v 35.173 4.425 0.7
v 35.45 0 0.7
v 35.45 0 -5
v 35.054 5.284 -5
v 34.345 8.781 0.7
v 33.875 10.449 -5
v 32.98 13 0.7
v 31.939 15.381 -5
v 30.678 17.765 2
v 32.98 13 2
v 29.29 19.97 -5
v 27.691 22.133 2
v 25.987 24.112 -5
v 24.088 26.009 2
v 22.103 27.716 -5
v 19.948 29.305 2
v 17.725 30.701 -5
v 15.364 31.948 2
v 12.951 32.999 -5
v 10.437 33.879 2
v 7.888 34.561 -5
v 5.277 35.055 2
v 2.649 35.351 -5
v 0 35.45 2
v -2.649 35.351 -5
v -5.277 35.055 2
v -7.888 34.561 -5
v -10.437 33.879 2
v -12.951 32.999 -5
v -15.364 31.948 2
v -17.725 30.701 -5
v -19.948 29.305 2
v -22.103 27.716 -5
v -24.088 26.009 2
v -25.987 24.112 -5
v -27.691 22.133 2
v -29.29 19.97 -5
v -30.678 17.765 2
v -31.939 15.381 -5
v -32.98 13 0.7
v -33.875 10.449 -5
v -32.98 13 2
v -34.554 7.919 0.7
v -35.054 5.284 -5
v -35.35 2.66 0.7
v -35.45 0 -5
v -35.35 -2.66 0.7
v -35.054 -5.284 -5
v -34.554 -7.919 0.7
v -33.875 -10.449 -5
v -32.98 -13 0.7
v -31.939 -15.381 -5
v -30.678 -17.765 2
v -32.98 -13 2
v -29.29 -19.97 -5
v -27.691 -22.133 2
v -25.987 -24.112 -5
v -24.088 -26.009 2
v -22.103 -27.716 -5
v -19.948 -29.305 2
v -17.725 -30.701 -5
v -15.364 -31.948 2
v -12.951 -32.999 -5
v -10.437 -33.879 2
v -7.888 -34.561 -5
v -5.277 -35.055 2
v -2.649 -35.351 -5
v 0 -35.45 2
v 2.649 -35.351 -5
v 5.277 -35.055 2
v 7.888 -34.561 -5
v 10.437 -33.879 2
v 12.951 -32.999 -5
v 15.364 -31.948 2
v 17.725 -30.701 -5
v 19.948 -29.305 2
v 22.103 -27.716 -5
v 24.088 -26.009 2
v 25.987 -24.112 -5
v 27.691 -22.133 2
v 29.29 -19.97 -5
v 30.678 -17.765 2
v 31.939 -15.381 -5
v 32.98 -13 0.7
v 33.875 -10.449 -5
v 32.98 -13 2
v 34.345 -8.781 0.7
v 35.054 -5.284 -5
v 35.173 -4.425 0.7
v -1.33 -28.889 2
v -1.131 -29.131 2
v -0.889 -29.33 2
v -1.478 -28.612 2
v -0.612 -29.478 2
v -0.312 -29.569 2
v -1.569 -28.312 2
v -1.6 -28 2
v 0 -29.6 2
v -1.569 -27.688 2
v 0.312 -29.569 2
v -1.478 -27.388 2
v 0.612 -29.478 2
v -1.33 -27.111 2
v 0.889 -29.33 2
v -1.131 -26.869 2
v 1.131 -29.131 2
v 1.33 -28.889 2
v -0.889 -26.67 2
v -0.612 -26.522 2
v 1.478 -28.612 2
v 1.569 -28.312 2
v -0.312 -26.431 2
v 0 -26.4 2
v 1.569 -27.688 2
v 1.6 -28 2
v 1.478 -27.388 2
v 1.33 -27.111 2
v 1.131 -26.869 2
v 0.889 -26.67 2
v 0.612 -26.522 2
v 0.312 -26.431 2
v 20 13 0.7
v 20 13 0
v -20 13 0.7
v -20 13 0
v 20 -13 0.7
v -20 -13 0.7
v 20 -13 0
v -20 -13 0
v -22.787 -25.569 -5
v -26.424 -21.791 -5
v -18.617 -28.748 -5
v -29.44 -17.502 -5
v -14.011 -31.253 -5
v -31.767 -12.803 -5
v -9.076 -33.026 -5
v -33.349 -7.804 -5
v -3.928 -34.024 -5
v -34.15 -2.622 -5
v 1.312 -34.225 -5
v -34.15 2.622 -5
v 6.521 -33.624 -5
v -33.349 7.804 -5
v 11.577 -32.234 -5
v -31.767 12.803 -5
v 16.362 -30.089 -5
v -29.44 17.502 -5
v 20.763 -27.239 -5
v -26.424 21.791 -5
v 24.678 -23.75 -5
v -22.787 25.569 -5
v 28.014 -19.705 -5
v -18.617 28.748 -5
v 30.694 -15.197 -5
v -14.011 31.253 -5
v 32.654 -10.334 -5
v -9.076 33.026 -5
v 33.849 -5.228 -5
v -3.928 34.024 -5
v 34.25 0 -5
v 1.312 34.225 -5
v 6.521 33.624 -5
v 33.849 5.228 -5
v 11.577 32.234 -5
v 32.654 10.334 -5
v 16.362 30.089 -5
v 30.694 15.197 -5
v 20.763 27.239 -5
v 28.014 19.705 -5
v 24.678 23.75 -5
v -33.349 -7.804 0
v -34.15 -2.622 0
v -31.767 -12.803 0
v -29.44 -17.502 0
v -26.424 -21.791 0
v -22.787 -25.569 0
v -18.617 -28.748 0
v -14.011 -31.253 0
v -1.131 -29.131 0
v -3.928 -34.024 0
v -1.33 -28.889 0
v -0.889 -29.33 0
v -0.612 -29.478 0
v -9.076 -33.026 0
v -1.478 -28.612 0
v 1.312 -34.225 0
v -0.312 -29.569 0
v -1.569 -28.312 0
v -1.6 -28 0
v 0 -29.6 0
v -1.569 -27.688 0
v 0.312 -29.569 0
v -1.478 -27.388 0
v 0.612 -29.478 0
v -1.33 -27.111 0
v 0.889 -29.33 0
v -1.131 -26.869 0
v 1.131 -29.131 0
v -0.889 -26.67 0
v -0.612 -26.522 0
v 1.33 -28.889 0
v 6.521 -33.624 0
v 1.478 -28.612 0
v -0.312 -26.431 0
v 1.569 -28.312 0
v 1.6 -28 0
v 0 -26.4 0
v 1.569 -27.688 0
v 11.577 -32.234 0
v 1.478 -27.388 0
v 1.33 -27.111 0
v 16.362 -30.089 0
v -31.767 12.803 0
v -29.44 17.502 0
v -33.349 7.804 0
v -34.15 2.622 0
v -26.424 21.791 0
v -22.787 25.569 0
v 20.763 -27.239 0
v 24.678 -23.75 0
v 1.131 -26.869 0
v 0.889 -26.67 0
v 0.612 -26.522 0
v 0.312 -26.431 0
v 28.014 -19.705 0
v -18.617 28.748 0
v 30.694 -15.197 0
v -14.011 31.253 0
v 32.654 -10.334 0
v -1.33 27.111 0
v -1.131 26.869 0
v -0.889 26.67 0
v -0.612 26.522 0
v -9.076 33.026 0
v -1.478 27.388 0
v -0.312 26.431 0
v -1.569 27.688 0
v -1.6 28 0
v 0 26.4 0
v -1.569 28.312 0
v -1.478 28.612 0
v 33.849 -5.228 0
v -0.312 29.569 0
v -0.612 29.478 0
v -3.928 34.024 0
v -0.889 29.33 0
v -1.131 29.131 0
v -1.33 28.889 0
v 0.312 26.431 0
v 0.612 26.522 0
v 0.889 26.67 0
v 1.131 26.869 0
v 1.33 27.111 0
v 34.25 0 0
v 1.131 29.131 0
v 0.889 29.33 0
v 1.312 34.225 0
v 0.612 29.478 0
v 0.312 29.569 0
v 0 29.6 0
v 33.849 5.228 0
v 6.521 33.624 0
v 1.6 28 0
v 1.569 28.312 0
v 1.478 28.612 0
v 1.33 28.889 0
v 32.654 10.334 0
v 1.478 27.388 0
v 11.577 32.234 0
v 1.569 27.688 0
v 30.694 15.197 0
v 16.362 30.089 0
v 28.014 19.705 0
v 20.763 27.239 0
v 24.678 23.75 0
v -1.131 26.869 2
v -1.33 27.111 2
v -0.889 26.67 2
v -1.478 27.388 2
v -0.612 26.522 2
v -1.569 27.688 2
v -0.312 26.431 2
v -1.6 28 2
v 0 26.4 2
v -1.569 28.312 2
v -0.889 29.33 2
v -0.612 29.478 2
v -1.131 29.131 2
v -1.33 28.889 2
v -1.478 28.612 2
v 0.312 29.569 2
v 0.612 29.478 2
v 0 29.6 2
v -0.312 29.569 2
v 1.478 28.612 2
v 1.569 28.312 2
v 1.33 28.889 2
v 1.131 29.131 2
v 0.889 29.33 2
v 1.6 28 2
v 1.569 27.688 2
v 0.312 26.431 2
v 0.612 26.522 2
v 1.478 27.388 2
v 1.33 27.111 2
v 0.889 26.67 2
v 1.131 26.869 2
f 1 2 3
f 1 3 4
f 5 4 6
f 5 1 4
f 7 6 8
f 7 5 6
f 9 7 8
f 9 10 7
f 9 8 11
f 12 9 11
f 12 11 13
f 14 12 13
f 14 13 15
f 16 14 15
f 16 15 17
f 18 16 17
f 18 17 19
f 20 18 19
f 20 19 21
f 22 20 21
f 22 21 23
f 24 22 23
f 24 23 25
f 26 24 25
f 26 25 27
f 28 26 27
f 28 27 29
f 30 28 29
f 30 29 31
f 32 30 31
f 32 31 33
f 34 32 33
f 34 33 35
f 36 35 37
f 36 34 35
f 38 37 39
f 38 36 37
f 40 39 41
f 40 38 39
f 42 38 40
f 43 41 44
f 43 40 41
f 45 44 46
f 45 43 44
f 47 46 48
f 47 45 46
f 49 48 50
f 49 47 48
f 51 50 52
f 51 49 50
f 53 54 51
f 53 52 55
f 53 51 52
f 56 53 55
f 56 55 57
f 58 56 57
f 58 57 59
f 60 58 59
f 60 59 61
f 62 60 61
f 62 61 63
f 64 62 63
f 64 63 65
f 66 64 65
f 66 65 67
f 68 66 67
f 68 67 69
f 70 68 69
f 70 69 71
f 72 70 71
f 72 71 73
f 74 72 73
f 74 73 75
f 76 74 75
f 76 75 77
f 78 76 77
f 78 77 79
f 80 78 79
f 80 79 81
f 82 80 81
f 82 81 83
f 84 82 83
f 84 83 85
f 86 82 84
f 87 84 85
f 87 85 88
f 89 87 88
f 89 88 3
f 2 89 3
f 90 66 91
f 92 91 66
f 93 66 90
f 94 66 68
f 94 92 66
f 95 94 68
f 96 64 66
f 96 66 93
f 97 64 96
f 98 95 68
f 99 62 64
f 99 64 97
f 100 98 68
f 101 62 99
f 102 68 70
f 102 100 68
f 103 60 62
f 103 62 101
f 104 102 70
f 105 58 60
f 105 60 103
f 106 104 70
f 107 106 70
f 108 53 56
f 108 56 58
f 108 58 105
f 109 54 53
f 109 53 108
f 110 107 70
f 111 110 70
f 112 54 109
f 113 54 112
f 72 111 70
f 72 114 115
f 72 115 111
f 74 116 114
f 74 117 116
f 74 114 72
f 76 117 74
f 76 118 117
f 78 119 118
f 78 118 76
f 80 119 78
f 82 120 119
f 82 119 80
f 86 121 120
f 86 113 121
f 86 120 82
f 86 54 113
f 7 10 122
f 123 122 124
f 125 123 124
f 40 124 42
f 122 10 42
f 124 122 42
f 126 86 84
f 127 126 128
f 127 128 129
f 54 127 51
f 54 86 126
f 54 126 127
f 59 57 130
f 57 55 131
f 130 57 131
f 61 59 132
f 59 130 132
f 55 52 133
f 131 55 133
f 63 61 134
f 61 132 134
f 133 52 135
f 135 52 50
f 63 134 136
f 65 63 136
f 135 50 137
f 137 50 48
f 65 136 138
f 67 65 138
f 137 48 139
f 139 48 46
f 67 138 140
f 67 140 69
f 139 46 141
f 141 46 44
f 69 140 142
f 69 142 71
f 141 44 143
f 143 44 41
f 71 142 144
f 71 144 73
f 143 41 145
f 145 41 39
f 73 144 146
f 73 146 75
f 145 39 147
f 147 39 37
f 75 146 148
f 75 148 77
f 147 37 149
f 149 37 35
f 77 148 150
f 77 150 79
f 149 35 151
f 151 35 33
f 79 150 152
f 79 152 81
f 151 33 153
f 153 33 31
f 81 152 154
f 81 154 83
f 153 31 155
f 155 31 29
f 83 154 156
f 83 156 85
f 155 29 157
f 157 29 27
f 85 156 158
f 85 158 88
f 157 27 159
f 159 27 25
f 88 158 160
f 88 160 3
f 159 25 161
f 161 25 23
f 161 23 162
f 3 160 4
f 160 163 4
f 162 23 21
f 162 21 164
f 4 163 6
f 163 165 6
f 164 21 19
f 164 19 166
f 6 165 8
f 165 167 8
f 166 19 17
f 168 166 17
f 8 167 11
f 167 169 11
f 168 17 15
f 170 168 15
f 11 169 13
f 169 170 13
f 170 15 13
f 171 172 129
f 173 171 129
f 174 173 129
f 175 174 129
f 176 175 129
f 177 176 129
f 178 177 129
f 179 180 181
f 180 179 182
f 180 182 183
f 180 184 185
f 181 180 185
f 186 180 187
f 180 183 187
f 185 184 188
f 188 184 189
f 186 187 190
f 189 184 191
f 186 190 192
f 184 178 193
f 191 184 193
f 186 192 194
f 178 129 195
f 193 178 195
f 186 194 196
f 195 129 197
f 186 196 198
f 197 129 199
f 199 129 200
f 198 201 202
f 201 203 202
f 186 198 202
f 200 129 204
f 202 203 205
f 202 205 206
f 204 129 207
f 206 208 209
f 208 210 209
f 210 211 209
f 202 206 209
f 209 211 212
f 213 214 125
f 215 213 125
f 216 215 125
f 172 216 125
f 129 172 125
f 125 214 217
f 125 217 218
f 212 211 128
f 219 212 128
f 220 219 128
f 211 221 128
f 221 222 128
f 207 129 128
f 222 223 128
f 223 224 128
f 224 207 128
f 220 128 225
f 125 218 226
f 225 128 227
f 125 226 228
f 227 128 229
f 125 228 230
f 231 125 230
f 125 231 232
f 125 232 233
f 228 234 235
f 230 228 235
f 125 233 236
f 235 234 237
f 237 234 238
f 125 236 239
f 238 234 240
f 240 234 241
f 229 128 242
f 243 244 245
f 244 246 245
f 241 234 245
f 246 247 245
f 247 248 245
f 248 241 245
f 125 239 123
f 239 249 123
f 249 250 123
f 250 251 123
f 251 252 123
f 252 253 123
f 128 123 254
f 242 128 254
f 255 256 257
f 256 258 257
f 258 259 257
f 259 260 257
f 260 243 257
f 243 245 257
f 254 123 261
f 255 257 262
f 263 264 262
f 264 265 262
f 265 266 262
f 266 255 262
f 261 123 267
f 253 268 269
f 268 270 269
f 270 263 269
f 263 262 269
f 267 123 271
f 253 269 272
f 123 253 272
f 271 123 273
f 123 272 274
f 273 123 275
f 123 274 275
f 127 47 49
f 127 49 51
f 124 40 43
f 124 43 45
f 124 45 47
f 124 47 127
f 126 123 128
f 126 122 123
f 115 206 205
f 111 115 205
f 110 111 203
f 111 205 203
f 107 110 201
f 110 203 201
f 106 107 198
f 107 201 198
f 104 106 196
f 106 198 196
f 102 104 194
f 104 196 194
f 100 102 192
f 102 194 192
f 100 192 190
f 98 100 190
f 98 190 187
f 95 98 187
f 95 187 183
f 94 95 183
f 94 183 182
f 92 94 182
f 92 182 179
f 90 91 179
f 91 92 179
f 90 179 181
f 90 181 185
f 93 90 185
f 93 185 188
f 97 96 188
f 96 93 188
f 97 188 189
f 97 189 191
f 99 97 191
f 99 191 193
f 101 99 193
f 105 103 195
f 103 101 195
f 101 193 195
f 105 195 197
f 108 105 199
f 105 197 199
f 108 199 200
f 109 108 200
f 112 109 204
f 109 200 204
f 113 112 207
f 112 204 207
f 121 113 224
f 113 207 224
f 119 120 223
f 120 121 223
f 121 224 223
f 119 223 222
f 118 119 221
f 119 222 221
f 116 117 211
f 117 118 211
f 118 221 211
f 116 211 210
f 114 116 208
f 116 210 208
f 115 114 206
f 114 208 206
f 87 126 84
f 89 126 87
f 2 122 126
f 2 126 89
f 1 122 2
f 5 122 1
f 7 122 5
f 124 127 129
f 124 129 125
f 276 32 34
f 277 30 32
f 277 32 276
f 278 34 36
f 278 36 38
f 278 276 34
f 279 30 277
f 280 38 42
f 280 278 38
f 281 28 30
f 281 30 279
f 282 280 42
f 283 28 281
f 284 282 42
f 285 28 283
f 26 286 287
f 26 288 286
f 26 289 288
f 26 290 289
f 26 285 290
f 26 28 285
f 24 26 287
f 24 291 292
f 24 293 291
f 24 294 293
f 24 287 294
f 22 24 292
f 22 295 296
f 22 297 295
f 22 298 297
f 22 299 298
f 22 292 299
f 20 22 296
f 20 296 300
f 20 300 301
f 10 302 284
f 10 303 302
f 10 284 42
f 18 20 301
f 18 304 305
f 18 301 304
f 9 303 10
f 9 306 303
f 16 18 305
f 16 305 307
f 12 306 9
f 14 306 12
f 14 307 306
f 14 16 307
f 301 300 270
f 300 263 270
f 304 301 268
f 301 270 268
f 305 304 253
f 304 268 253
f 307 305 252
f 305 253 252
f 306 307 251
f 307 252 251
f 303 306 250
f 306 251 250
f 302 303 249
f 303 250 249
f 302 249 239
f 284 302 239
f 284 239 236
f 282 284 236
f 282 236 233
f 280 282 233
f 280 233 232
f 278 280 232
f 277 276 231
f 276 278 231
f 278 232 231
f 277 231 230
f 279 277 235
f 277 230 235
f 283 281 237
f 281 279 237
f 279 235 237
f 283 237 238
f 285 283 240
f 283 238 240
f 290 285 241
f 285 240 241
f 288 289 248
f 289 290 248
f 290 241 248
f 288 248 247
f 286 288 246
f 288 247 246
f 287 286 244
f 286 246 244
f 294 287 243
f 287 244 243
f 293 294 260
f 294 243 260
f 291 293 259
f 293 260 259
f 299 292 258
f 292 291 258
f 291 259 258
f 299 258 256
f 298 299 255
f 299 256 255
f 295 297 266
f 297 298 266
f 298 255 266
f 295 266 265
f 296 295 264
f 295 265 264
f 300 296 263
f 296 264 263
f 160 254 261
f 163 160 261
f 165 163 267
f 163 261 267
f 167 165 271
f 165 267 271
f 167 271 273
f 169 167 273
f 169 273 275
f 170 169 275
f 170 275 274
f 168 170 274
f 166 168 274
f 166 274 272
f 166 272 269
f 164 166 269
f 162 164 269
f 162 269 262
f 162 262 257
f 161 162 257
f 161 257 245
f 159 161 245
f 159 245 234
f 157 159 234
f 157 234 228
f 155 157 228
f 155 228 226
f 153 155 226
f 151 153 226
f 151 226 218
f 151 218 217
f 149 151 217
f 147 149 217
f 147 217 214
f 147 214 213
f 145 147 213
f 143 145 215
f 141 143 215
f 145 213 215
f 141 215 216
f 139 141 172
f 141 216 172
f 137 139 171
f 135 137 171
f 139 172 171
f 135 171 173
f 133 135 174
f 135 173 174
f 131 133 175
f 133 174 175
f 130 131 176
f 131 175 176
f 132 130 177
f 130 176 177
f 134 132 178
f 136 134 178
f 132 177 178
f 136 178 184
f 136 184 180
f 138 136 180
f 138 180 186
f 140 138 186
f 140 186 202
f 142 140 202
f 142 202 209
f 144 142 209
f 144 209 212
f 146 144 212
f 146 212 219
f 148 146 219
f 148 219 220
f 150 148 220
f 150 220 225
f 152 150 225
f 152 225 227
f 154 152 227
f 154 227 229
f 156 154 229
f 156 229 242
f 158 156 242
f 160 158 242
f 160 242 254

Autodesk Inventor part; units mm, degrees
ref_plane "YZ Plane" through (0, 0, 0) normal (1, 0, 0) x (0, 1, 0)
ref_plane "XZ Plane" through (0, 0, 0) normal (0, 1, 0) x (-1, 0, 0)
ref_plane "XY Plane" through (0, 0, 0) normal (0, 0, 1) x (1, 0, 0)
sketch "Sketch1" plane through (0, 0, 0) normal (0, 0, 1) x (1, 0, 0)
  circle A0 centre (0, 0) radius 34 construction
  circle A1 centre (0, 28) radius 1.6 projected
  circle A2 centre (0, -28) radius 1.6 projected
  circle A3 centre (0, 0) radius 34.25
  circle A4 centre (0, 0) radius 35.45
  dimension "d0" = 0.25
  dimension "d1" = 1.2
extrude "Extrusion1" add sketch "Sketch1" against normal blind 5 contours A4
sketch "Sketch4" plane through (0, 0, 0) normal (0, 0, 1) x (1, 0, 0)
  circle A0 centre (0, 0) radius 35.45 projected
  circle A1 centre (0, 28) radius 1.6 projected
  circle A2 centre (0, -28) radius 1.6 projected
extrude "Extrusion2" add sketch "Sketch4" along normal blind 2
sketch "Sketch5" plane through (0, 0, 2) normal (0, 0, 1) x (1, 0, 0)
  circle A0 centre (0, 0) radius 35.45 projected
  line L0 (-20, 13) -> (20, 13)
  line L1 (20, 13) -> (20, -13)
  line L2 (20, -13) -> (-20, -13)
  line L3 (-20, -13) -> (-20, 13)
  line L4 (-20, 13) -> (20, -13) construction
  line L5 (20, 13) -> (-20, -13) construction
  dimension "d6" = 40
  dimension "d7" = 26
extrude "Extrusion3" cut sketch "Sketch5" against normal through all contours L0 L1 L2 L3
sketch "Sketch6" plane through (0, 0, 2) normal (0, 0, 1) x (1, 0, 0)
  line L0 (32.2267, 13) -> (20, 13)
  line L1 (20, -13) -> (32.2267, -13)
  circle A0 centre (0, 0) radius 35.45
  circle A1 centre (0, 0) radius 35.45 projected
  line L2 (32.9803, 13) -> (-32.9803, 13)
  line L3 (-20, 13) -> (20, 13) projected
  line L4 (32.9803, -13) -> (-32.9803, -13)
extrude "Extrusion4" cut sketch "Sketch6" against normal blind 1.3 contours L2 A0 L4 L1 L0
properties part number "LensMount_frame"
